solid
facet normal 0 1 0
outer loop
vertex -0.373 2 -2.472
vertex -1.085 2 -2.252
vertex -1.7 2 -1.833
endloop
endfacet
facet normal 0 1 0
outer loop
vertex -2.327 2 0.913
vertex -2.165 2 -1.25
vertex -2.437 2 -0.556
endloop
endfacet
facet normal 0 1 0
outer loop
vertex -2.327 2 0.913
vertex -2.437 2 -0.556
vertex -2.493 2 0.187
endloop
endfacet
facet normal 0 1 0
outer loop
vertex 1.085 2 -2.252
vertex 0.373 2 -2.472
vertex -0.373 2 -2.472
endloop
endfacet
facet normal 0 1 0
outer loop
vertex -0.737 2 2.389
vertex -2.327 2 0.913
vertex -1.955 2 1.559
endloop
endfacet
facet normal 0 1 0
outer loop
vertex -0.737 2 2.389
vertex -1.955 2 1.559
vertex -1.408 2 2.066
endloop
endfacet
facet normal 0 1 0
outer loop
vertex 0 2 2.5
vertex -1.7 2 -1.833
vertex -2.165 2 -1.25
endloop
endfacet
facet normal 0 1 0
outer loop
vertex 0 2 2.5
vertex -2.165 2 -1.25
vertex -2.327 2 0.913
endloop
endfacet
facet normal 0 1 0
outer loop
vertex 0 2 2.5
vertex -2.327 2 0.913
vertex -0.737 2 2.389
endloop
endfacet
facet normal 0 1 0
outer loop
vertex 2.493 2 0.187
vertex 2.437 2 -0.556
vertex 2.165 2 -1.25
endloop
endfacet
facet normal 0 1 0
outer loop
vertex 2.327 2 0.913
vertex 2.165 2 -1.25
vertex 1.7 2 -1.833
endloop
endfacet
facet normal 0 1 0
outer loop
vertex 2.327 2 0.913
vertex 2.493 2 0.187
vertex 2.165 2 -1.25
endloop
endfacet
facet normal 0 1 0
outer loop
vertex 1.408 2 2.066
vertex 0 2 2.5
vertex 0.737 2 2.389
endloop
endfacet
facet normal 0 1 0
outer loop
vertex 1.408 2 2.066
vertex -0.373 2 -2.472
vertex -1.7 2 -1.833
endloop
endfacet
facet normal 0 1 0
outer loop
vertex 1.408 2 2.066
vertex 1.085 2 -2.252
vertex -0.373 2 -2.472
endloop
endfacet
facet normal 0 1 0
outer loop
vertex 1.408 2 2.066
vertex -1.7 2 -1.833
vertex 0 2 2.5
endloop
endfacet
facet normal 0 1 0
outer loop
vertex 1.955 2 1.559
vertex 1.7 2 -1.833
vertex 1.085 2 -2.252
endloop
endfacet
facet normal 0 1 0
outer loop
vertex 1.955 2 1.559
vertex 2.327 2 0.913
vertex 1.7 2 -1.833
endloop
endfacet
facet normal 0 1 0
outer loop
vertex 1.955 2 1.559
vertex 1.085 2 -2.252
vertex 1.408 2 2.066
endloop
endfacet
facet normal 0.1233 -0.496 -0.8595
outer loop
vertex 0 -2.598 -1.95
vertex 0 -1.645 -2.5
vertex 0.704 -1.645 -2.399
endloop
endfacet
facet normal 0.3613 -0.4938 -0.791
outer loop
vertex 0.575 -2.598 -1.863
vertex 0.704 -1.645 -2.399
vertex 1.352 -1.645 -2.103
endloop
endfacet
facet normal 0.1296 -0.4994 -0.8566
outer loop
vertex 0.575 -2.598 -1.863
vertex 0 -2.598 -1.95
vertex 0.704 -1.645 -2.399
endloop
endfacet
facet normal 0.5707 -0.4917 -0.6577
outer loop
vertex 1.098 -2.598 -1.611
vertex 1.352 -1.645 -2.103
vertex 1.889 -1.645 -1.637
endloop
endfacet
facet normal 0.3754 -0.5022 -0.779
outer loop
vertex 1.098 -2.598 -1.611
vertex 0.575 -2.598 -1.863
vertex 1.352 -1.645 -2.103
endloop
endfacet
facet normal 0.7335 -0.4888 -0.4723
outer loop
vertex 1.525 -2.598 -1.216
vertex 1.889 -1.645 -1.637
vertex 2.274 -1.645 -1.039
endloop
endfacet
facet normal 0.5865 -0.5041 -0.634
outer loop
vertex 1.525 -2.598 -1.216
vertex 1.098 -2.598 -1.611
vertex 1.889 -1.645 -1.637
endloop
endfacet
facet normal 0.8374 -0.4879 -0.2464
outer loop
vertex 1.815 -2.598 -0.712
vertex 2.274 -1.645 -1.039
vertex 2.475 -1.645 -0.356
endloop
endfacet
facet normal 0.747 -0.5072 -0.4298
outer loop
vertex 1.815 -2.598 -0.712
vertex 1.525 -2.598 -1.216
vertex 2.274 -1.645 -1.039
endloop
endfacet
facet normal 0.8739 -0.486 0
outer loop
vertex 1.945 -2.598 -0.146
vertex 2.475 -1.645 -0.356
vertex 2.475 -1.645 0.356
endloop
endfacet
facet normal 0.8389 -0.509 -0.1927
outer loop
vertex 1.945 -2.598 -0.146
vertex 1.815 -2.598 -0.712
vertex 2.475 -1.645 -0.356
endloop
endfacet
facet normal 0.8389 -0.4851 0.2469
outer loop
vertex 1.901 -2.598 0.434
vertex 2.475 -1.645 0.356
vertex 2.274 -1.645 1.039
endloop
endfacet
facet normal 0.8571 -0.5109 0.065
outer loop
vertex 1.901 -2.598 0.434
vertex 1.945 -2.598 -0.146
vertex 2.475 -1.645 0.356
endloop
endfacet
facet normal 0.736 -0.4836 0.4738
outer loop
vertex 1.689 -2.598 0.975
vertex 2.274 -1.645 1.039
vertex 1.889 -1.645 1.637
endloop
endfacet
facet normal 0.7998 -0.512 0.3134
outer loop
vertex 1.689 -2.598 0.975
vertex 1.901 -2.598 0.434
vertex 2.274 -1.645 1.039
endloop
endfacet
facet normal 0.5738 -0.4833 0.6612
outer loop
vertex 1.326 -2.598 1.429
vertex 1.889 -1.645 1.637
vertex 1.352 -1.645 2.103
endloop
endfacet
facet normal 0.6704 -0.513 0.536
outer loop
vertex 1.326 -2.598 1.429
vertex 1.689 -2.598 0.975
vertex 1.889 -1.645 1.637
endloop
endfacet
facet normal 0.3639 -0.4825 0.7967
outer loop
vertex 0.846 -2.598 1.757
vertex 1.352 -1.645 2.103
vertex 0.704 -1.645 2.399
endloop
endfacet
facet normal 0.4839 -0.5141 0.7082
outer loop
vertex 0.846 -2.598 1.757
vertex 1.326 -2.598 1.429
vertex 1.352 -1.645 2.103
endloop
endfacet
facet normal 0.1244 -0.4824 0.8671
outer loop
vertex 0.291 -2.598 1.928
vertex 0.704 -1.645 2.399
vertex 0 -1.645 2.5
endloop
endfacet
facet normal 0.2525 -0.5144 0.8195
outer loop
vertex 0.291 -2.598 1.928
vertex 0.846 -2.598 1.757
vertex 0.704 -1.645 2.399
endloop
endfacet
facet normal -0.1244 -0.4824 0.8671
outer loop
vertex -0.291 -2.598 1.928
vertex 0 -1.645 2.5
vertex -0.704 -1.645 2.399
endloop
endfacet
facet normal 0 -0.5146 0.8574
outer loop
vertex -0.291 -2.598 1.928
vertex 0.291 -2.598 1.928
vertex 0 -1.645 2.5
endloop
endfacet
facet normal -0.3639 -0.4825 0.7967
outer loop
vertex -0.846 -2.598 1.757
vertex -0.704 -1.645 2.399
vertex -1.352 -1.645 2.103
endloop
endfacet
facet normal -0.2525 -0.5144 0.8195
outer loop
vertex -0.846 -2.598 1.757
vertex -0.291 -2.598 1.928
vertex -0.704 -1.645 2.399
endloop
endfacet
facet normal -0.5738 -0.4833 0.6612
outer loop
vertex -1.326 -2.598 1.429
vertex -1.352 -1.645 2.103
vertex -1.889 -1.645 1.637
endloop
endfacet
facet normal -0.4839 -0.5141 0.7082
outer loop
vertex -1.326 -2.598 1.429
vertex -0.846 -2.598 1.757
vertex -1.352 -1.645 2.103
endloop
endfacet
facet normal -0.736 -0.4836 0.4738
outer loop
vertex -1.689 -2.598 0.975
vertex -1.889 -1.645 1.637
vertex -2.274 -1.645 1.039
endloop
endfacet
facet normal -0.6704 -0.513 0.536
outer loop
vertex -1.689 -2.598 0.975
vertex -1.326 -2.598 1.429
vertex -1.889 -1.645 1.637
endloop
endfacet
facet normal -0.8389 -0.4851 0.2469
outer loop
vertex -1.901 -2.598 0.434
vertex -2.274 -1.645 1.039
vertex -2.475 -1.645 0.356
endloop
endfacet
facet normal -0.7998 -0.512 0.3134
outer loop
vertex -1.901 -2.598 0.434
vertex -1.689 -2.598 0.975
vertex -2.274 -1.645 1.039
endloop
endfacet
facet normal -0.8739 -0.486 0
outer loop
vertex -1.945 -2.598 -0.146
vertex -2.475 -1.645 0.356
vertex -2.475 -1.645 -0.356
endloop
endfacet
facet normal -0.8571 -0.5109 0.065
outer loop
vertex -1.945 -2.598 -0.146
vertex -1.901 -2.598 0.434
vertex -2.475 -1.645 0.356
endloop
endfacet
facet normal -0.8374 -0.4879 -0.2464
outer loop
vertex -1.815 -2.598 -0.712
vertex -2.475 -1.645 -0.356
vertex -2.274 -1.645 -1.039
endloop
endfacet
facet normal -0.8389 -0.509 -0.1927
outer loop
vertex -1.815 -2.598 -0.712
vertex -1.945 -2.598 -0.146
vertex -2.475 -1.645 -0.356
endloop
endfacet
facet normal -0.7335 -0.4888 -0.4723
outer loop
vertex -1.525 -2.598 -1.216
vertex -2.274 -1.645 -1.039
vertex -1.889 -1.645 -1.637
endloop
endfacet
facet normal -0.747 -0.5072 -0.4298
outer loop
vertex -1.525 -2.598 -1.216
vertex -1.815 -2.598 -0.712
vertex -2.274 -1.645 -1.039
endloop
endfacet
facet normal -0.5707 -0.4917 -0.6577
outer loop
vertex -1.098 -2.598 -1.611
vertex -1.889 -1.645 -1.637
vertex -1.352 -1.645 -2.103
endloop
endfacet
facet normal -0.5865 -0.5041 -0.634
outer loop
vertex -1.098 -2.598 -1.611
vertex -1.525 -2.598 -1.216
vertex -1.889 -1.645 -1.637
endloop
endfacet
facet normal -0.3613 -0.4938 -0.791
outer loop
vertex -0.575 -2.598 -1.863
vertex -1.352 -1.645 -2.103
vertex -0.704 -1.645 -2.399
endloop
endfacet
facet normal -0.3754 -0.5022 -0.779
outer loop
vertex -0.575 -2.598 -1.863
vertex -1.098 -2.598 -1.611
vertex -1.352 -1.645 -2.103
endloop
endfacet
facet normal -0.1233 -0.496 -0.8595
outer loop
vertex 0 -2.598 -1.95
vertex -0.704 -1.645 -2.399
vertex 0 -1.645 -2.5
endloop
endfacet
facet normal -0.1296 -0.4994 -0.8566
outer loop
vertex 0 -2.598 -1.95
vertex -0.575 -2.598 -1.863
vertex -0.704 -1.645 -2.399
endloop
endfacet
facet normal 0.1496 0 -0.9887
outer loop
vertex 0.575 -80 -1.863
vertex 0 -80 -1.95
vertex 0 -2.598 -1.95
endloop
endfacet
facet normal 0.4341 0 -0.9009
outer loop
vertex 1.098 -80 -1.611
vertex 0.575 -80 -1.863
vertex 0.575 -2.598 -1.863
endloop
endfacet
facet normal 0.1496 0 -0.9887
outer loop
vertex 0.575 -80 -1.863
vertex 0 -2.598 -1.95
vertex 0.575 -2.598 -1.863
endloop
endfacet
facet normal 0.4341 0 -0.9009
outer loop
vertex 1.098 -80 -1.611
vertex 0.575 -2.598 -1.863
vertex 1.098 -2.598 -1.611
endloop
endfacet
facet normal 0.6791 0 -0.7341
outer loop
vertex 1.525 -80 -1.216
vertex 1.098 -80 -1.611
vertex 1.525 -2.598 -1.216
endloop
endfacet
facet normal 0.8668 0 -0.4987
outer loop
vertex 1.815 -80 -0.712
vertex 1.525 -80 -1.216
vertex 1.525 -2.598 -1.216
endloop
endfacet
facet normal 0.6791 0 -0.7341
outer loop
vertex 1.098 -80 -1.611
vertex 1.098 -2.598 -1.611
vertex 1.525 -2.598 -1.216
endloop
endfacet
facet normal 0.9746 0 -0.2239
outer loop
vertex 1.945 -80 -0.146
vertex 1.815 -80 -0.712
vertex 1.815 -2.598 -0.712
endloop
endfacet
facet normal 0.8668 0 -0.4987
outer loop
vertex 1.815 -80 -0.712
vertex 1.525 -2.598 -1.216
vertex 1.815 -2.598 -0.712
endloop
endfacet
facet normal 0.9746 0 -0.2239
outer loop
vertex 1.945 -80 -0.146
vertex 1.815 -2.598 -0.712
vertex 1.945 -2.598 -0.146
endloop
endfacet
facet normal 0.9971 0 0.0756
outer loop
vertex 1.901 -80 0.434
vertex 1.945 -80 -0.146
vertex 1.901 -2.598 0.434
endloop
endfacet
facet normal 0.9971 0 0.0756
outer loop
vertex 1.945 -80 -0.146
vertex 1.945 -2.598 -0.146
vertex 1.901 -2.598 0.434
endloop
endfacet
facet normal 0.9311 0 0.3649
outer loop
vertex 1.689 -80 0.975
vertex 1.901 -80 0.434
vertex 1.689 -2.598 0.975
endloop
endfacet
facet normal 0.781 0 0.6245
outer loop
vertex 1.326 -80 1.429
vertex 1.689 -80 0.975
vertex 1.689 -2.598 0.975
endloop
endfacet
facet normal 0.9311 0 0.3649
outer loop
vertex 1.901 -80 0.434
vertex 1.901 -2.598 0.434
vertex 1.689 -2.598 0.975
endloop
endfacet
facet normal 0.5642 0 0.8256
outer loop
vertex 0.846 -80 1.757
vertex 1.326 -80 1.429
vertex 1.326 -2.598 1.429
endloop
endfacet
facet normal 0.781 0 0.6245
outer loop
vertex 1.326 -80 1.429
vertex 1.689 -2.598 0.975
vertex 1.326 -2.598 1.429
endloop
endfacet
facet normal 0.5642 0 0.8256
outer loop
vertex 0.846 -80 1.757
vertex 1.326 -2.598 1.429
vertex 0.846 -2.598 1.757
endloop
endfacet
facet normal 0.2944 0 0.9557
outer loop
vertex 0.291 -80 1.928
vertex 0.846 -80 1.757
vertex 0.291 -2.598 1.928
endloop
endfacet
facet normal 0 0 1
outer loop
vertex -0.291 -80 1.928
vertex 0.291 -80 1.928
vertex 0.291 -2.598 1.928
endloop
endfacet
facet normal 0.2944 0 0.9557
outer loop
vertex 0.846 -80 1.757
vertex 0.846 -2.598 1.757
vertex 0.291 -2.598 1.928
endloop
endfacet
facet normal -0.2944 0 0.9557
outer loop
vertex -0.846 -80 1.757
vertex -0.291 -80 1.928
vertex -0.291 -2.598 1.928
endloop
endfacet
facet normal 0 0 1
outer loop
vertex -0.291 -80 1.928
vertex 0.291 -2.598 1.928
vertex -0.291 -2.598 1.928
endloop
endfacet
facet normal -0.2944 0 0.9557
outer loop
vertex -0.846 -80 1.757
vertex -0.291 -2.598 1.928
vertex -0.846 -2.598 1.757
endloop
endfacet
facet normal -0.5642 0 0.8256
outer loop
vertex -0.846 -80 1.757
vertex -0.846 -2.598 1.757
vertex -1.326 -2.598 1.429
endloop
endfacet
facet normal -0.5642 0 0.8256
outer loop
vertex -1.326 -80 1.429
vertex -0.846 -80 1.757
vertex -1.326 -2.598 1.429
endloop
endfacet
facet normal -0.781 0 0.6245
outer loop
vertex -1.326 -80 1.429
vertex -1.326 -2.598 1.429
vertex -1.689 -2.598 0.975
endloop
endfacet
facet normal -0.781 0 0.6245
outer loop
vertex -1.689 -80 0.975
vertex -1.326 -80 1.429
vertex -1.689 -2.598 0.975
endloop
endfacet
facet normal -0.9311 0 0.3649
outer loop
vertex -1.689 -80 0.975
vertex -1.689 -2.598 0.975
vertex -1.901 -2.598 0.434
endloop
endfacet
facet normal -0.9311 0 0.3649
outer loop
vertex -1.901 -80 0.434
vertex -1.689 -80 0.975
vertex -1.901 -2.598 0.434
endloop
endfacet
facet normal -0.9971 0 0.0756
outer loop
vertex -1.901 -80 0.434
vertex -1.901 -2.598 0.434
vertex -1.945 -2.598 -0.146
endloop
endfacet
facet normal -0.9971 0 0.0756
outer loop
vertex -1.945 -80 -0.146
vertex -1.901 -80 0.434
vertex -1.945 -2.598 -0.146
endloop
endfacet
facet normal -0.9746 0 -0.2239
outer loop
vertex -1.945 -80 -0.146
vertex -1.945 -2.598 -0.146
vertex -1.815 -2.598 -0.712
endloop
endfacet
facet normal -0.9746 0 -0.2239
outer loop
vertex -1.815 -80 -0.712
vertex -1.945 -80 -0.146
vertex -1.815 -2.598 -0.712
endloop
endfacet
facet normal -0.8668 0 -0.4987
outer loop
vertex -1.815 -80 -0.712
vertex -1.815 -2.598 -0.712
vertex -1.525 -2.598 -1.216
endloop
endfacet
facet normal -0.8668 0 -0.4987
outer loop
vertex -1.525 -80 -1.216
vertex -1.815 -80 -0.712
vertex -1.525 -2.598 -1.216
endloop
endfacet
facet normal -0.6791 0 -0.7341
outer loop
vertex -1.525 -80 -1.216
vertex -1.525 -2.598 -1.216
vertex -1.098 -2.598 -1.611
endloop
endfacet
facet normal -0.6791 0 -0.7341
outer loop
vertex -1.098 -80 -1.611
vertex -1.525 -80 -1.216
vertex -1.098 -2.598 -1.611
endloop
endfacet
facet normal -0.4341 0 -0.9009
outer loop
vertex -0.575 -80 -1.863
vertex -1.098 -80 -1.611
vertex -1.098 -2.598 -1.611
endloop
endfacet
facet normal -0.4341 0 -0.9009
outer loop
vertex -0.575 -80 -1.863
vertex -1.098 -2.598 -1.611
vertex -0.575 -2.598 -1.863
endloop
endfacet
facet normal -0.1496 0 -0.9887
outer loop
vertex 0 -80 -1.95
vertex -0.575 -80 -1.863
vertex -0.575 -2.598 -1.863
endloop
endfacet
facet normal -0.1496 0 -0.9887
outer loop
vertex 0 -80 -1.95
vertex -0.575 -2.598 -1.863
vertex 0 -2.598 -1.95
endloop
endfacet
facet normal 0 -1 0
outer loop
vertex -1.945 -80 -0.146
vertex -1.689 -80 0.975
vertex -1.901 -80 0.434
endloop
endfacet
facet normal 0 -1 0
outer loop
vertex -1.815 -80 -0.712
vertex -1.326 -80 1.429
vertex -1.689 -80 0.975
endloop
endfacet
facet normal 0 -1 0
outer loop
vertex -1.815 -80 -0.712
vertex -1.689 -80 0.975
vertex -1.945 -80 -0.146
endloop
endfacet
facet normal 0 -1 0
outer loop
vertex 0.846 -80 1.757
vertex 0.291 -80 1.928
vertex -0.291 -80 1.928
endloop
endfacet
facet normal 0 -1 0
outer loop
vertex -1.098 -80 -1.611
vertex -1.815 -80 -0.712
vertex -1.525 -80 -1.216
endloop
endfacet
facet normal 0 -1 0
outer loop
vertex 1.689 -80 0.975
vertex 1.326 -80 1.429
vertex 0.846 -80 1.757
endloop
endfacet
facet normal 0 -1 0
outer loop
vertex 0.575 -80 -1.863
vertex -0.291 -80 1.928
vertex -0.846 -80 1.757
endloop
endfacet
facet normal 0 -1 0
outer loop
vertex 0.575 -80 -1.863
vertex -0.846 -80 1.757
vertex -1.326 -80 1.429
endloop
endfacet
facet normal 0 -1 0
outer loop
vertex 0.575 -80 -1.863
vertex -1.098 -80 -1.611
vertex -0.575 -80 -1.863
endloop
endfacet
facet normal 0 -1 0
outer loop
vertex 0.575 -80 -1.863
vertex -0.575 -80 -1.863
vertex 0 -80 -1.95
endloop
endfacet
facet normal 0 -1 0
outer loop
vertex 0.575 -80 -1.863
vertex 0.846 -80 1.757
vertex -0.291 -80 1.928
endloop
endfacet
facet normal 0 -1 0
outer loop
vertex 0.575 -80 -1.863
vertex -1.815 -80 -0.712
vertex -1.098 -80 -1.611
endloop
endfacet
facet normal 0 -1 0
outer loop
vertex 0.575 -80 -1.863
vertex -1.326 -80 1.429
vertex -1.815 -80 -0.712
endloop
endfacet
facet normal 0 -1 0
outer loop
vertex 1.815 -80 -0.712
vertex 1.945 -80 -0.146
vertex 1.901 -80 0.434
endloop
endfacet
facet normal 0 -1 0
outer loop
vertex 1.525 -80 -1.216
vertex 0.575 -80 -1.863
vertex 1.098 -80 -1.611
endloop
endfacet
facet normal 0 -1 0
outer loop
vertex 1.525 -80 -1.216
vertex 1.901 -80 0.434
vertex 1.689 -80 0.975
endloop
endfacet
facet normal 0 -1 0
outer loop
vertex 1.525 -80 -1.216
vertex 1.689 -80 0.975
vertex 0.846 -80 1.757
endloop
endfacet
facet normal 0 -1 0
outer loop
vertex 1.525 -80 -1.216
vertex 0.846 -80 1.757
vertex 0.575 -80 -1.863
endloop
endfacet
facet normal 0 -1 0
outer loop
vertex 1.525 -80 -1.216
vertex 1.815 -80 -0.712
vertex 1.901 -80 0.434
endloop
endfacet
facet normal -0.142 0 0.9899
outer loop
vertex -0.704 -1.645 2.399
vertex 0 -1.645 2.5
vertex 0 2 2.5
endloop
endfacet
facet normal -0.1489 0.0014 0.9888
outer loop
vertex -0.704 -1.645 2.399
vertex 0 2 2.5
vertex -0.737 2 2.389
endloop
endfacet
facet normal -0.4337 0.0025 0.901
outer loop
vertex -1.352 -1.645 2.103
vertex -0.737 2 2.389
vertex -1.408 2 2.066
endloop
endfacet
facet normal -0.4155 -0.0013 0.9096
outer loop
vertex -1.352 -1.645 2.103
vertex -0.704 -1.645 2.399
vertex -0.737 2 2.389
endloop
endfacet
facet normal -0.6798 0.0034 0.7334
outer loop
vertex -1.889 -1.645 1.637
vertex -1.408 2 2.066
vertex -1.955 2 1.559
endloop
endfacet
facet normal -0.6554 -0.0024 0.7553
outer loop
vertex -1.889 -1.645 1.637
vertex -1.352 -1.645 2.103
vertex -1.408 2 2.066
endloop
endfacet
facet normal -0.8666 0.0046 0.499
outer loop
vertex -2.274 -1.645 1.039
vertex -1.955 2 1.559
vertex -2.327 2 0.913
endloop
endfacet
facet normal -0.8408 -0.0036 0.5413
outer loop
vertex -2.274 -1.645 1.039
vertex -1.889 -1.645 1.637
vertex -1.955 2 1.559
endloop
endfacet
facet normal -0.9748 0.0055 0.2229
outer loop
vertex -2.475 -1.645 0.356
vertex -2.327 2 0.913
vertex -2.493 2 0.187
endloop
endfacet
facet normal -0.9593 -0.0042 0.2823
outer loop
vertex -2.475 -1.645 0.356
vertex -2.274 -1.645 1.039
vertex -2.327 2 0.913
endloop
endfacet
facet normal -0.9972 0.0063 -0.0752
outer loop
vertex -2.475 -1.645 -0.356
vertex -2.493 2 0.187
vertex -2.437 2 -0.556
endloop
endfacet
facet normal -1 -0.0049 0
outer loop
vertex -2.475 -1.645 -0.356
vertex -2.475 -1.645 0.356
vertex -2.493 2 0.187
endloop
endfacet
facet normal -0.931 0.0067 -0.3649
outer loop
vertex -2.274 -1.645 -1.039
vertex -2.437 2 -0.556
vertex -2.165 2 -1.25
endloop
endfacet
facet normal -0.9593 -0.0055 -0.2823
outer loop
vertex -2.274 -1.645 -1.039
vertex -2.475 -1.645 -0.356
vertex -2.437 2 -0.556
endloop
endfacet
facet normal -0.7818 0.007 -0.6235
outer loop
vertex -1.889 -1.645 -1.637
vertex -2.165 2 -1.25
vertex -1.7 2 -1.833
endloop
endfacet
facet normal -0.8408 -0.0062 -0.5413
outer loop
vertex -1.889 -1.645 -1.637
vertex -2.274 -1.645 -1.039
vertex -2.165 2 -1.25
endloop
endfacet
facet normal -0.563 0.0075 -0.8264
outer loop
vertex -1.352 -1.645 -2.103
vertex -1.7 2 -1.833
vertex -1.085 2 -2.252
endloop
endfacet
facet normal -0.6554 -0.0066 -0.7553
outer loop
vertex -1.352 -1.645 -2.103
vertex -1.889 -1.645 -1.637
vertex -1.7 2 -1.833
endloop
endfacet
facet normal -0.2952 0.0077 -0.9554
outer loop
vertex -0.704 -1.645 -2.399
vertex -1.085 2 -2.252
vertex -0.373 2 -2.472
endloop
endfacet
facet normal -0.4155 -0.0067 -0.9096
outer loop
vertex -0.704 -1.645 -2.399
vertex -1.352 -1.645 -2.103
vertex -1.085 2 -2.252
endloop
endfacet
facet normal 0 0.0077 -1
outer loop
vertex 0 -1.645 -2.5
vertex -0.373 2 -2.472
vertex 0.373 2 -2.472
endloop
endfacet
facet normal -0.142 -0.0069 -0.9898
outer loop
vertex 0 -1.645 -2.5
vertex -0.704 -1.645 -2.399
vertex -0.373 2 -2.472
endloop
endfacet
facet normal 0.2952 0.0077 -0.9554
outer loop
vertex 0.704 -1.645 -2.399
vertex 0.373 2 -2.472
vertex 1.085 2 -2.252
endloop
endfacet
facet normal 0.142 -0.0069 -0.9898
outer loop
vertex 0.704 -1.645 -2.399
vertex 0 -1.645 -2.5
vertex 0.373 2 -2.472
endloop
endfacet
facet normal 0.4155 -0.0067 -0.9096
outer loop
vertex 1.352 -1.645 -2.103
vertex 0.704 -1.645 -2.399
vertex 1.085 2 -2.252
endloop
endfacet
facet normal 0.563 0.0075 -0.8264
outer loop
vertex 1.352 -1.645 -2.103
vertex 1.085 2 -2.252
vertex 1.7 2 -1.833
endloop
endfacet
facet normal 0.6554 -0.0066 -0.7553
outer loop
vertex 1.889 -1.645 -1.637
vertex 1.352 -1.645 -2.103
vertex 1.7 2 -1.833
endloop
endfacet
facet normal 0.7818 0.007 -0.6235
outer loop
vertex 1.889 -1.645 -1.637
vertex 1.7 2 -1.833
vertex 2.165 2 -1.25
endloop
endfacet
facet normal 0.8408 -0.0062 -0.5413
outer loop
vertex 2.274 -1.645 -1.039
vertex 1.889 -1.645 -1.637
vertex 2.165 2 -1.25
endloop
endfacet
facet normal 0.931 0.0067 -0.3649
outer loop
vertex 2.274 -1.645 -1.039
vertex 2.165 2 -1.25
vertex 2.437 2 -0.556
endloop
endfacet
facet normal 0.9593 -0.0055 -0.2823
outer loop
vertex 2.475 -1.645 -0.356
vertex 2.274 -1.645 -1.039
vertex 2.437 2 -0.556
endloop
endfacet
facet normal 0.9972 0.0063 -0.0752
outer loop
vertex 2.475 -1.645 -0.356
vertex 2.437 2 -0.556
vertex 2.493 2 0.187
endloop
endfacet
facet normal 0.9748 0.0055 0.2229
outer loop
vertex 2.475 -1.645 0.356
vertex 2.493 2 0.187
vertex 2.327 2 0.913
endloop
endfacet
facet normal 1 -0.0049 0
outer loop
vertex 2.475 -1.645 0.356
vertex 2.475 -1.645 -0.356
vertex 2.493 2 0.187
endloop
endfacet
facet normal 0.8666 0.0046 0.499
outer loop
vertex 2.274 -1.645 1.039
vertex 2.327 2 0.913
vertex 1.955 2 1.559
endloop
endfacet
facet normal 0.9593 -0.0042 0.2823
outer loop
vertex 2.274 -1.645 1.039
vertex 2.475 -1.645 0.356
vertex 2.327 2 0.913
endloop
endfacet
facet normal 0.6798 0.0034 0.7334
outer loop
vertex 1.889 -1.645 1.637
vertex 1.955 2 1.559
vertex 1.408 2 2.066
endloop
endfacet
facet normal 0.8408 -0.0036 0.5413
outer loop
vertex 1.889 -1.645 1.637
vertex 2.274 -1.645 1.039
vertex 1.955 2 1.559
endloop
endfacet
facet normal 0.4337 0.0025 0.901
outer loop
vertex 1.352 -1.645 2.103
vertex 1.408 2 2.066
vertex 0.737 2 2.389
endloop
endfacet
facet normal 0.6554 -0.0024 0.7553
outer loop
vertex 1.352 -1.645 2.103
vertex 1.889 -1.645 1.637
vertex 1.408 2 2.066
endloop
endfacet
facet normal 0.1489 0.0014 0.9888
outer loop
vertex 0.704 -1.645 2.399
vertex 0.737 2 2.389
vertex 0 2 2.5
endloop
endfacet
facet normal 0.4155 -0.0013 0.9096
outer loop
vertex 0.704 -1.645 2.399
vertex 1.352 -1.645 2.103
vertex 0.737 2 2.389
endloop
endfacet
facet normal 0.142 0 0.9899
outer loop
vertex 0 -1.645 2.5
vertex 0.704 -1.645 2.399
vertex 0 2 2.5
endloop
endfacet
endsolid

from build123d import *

# Parameters (mm, degrees)
SKETCH_1_R       = 2.5
EXTRUDE_1_DEPTH  = 2
SKETCH_2_R       = 1.95
EXTRUDE_2_DEPTH  = 80
CHAMFER_1_SIZE   = 1.5
CHAMFER_1_SIZE_2 = 2.598076211


with BuildPart() as part:
    # 草图1 → 凸台-拉伸1 (new body)
    with BuildSketch(Plane(origin=(0, 0, 0), x_dir=(1, 0, 0), z_dir=(0, 1, 0))):
        with Locations(Location((0, 0, 0), (0, 0, 270))):
            Circle(SKETCH_1_R)
    extrude(amount=EXTRUDE_1_DEPTH)

    # 草图2 → 凸台-拉伸2 (add)
    with BuildSketch(Plane.XZ):
        with Locations(Location((0, 0, 0), (0, 0, 270))):
            Circle(SKETCH_2_R)
    extrude(amount=EXTRUDE_2_DEPTH)

    # 倒角1
    # the kernel refuses this chamfer: 2.598076211, 1.5 mm, written as the material it adds along each edge
    with BuildSketch(Plane(origin=(0, 0, 0), x_dir=(0, 0, -1), z_dir=(-1, 0, 0))) as chamfer_1_piece_1_section:
        Polygon((1.95 + CHAMFER_1_SIZE, 0), (1.95, CHAMFER_1_SIZE_2), (1.95, 0), align=None)
    chamfer_1_piece_1 = revolve(axis=Axis((0, 0, 0), (0, -1, 0)), mode=Mode.PRIVATE)
    chamfer_1_piece_1 = chamfer_1_piece_1 & Plane(origin=(0, -2.153550613, 0), x_dir=(0, 0, 1), z_dir=(0, -1, 0)) * Cylinder(2.5, 14, mode=Mode.PRIVATE)
    add(chamfer_1_piece_1)


solid = part.part
